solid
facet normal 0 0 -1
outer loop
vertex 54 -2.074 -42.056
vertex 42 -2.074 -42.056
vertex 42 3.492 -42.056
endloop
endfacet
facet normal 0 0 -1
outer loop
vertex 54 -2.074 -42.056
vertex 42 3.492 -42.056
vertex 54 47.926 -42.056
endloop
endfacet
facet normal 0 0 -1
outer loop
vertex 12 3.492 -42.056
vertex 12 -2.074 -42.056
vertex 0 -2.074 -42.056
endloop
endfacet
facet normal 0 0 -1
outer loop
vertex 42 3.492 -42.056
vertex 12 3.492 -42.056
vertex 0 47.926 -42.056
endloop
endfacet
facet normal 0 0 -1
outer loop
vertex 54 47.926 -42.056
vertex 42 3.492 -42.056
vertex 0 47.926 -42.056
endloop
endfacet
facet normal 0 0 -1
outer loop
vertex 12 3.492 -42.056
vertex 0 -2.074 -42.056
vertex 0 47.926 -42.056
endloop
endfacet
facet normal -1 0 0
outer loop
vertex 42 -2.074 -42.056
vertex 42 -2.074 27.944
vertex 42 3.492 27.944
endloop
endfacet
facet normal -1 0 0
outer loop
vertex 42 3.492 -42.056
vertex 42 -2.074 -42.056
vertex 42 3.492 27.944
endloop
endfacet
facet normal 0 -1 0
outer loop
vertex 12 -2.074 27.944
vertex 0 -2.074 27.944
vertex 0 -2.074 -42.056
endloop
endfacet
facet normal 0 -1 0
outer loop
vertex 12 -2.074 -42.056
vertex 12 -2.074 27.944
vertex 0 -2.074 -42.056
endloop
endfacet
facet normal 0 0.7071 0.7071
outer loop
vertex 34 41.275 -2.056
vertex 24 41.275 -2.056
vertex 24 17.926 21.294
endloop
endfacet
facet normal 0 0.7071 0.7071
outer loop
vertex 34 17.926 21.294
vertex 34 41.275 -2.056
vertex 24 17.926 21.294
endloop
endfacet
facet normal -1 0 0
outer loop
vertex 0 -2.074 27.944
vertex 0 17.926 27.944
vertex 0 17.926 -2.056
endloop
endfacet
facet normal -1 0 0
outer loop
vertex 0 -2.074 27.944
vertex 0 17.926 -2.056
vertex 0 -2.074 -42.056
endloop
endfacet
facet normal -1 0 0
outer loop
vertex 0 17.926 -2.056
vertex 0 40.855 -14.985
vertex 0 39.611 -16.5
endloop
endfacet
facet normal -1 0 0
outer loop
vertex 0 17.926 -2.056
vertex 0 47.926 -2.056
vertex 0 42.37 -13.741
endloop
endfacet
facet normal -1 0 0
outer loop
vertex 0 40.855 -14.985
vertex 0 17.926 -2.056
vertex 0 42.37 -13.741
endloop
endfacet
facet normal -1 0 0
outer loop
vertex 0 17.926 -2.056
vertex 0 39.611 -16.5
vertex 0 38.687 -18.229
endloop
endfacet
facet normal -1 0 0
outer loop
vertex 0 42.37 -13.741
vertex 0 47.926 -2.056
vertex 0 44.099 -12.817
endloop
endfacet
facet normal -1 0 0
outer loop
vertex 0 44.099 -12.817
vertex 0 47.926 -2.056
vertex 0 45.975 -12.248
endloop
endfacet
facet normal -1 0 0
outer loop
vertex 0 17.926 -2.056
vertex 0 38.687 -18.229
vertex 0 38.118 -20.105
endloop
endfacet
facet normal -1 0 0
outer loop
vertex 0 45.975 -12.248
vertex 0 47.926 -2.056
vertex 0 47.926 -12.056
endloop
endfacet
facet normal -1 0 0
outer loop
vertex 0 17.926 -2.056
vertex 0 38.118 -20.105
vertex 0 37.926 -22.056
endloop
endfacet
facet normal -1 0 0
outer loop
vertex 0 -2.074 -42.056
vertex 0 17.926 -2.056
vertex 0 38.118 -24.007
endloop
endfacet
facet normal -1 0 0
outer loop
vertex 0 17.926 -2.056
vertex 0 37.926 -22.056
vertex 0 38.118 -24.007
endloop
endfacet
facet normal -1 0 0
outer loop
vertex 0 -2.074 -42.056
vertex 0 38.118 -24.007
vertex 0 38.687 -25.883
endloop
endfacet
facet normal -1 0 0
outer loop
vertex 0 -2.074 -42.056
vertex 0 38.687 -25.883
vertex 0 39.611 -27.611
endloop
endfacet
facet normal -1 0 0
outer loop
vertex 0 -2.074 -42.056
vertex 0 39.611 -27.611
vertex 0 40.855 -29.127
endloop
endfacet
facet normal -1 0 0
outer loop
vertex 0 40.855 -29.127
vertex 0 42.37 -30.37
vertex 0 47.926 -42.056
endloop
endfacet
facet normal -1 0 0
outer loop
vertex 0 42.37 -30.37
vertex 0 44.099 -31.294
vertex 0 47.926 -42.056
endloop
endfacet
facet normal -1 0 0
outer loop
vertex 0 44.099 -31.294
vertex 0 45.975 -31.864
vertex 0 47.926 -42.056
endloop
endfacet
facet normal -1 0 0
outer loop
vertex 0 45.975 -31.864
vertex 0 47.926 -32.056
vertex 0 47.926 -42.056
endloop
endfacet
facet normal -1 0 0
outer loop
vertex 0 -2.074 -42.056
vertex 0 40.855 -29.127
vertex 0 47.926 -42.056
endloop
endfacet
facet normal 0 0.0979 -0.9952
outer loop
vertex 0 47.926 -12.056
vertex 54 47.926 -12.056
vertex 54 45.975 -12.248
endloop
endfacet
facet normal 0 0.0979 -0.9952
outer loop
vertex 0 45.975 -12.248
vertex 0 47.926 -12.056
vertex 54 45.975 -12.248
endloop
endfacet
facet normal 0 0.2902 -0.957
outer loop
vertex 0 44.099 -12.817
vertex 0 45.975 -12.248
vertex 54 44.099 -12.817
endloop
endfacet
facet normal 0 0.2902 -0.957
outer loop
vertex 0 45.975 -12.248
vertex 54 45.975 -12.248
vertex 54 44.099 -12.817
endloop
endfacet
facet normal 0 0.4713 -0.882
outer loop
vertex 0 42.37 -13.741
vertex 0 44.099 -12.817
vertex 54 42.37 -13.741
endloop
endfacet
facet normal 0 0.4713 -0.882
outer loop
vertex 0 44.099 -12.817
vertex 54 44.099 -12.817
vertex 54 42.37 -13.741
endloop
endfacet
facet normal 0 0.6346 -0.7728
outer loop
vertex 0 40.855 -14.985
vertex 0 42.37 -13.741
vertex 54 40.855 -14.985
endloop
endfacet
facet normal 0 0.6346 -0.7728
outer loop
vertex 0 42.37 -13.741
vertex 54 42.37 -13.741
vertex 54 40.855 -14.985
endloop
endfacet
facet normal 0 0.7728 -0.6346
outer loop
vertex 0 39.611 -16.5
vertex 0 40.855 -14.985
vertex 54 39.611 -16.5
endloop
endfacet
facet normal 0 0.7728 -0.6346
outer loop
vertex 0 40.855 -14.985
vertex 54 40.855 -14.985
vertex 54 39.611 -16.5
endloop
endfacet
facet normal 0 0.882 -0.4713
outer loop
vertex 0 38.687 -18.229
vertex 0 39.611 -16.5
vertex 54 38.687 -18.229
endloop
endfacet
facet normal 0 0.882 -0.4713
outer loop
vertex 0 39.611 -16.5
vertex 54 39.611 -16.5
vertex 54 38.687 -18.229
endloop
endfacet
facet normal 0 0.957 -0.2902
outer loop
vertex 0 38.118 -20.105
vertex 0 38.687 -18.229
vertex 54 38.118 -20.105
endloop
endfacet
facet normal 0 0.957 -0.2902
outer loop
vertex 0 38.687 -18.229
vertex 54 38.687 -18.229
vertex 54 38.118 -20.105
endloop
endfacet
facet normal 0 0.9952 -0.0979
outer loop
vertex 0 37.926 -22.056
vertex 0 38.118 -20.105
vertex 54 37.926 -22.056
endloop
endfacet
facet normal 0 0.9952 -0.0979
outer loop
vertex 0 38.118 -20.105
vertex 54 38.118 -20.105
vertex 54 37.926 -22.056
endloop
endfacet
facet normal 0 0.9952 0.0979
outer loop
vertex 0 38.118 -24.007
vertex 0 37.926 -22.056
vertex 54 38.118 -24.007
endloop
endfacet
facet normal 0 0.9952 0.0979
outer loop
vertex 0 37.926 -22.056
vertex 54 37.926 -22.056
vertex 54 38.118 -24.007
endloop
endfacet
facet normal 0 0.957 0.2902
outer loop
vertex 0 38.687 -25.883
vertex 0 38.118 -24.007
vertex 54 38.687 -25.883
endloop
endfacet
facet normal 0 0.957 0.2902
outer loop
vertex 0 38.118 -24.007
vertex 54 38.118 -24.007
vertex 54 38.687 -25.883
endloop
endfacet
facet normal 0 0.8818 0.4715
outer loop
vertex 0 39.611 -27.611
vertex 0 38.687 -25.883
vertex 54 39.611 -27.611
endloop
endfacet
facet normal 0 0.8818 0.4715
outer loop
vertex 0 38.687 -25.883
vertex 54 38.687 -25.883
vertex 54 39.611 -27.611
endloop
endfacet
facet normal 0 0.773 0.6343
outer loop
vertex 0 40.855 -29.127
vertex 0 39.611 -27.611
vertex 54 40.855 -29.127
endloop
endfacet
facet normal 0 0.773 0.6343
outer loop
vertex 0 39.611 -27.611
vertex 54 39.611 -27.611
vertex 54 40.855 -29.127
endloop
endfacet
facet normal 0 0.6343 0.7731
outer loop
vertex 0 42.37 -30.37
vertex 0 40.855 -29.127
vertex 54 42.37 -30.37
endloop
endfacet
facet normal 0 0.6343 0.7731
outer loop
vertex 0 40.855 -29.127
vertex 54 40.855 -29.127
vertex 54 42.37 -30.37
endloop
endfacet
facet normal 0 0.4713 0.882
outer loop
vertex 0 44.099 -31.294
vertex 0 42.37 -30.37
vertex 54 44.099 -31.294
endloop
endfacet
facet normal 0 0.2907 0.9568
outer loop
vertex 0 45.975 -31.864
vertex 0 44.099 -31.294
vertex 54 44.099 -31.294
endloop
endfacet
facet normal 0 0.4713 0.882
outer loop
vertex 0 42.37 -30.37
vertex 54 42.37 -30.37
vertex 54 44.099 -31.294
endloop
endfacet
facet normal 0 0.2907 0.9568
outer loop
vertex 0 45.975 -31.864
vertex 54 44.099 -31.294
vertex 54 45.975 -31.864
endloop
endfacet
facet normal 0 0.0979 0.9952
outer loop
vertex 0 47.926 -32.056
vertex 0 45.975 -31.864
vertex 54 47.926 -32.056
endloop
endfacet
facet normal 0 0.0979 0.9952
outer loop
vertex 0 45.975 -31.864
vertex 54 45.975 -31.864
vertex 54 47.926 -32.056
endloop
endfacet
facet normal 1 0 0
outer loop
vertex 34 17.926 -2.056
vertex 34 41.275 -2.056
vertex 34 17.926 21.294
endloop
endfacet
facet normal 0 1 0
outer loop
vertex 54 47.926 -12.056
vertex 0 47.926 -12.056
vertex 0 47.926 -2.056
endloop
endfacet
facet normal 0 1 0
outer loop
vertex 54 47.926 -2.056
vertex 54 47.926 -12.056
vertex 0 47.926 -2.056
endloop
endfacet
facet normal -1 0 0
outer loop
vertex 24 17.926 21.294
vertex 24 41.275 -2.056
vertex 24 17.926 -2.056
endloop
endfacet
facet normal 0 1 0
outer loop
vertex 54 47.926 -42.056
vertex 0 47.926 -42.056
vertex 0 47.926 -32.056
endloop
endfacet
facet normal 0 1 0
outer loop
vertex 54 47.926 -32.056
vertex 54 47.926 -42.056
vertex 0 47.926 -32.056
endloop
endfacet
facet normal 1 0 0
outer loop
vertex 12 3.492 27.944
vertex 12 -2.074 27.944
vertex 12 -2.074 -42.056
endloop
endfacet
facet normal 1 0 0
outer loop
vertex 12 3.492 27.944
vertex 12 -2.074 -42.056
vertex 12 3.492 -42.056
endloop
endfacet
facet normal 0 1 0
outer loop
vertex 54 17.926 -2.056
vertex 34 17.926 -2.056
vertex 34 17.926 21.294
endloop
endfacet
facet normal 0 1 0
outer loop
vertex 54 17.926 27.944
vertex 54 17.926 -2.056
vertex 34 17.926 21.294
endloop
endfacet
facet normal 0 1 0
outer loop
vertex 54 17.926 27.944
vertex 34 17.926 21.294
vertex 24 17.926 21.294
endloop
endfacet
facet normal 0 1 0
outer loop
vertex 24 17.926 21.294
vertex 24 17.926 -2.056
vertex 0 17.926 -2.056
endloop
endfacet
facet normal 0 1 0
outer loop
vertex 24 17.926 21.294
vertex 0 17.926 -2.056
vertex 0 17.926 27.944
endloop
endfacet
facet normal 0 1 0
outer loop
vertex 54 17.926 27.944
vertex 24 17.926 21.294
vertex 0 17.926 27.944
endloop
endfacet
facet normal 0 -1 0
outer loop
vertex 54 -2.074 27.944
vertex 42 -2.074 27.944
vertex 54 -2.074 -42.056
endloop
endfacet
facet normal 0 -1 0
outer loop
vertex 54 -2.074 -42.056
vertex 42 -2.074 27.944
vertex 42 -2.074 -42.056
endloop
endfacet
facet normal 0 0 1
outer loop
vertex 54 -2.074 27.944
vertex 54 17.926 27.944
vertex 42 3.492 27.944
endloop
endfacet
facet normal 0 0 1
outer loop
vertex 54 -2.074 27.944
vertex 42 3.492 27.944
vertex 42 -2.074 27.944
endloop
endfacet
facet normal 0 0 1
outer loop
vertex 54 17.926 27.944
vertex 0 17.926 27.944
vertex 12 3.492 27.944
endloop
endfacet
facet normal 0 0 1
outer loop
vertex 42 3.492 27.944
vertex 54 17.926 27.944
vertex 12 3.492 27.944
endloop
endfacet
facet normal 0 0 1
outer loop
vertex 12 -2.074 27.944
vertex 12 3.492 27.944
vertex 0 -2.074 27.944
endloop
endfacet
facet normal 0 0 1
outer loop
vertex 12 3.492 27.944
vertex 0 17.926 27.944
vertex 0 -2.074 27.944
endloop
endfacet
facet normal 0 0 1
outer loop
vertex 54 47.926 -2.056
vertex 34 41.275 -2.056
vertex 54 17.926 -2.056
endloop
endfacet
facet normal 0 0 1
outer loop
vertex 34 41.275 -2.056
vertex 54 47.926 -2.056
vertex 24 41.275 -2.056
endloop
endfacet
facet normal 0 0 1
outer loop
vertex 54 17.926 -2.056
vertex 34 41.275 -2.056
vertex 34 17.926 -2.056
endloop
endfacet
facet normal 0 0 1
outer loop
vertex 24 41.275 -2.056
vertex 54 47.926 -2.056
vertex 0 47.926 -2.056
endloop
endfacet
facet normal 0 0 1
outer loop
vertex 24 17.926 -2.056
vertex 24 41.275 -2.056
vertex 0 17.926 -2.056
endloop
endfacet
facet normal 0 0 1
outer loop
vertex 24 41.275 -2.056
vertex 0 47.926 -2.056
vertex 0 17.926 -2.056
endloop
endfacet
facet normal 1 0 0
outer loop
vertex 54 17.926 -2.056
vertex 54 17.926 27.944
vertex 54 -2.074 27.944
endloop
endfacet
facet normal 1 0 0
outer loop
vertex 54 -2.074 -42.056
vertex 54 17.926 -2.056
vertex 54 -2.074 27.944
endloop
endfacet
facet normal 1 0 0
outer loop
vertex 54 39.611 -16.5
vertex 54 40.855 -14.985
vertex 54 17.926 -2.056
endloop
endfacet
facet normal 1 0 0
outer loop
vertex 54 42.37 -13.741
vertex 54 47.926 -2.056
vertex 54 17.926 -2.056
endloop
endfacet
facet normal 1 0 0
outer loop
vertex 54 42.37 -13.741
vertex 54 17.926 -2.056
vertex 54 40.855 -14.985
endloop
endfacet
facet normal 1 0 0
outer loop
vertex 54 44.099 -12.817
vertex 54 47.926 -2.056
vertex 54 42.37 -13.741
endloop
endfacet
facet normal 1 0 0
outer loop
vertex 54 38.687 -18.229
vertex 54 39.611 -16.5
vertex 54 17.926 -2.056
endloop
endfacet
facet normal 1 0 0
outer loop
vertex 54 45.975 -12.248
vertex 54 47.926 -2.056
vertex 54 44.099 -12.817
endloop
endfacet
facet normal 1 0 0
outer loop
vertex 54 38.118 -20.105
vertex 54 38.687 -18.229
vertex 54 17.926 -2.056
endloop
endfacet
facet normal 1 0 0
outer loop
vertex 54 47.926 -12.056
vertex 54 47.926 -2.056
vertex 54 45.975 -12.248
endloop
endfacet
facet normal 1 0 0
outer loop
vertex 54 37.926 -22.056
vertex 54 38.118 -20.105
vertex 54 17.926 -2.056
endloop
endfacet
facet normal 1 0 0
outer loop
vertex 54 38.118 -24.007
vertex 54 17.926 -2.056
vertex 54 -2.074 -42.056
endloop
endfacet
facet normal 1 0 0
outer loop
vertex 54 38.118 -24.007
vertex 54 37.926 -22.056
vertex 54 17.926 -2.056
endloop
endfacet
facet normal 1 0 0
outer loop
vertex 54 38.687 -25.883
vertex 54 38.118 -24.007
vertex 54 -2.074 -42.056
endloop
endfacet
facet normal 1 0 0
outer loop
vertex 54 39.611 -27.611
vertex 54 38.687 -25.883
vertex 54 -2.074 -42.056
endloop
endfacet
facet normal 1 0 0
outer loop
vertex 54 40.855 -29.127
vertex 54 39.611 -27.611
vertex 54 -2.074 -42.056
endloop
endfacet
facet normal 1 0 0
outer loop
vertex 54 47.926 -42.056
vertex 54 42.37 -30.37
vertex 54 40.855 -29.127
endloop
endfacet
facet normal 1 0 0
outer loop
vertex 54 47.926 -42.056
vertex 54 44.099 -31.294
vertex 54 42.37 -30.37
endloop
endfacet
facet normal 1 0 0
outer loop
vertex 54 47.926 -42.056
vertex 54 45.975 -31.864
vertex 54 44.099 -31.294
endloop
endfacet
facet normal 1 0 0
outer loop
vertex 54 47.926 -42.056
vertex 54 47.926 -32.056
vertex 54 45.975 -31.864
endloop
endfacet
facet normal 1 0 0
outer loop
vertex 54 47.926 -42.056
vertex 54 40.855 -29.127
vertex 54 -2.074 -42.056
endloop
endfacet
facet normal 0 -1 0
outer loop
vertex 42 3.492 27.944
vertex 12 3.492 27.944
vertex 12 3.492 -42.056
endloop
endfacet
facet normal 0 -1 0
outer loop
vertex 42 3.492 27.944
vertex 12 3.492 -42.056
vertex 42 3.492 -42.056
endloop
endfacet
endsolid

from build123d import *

# Parameters (mm, degrees)
BOSS_EXTRUDE1_DEPTH = 54
SKETCH2_R           = 10
CUT_EXTRUDE1_DEPTH  = 84.555784218
RIB4_REACH          = 74.26
SKETCH5_WALL_W      = 188.871183906
SKETCH5_WALL_H      = 10
SKETCH6_W           = 30
SKETCH6_H           = 11.131491479
CUT_EXTRUDE2_DEPTH  = 101.562854881


with BuildPart() as part:
    # Sketch1 → Boss-Extrude1 (new body)
    with BuildSketch(Plane(origin=(0, 0, 0), x_dir=(0, 0, -1), z_dir=(1, 0, 0))):
        Polygon((42.055692771, 47.925857131), (2.055692771, 47.925857131), (2.055692771, 17.925857131), (-27.944307229, 17.925857131), (-27.944307229, -2.074142869), (42.055692771, -2.074142869), align=None)
    extrude(amount=BOSS_EXTRUDE1_DEPTH)

    # Sketch2 → Cut-Extrude1 (cut, through all)
    with BuildSketch(Plane(origin=(54, 0, 0), x_dir=(0, 0, -1), z_dir=(1, 0, 0))):
        with Locations((22.055692771, 47.925857131)):
            Circle(SKETCH2_R)
    extrude(amount=-CUT_EXTRUDE1_DEPTH, mode=Mode.SUBTRACT)

    # Sketch5 wall → Rib4 (add, up to next)
    with BuildSketch(Plane(origin=(34, 28.80129121, 10.41851211), x_dir=(0, -0.707106781187, 0.707106781187), z_dir=(0, -0.707106781187, -0.707106781187)), mode=Mode.PRIVATE) as rib4_sk1:
        with Locations((0, 5)):
            Rectangle(SKETCH5_WALL_W, SKETCH5_WALL_H)
    rib4_tool1 = extrude(rib4_sk1.sketch, amount=RIB4_REACH, mode=Mode.PRIVATE) - part.part
    add(rib4_tool1.solids().sort_by_distance((34, 28.80129121, 10.41851211))[0])

    # Sketch6 → Cut-Extrude2 (cut, through all)
    with BuildSketch(Plane.XY.offset(27.944307229)):
        with Locations((27, -2.074142869)):
            Rectangle(SKETCH6_W, SKETCH6_H)
    extrude(amount=-CUT_EXTRUDE2_DEPTH, mode=Mode.SUBTRACT)


solid = part.part
